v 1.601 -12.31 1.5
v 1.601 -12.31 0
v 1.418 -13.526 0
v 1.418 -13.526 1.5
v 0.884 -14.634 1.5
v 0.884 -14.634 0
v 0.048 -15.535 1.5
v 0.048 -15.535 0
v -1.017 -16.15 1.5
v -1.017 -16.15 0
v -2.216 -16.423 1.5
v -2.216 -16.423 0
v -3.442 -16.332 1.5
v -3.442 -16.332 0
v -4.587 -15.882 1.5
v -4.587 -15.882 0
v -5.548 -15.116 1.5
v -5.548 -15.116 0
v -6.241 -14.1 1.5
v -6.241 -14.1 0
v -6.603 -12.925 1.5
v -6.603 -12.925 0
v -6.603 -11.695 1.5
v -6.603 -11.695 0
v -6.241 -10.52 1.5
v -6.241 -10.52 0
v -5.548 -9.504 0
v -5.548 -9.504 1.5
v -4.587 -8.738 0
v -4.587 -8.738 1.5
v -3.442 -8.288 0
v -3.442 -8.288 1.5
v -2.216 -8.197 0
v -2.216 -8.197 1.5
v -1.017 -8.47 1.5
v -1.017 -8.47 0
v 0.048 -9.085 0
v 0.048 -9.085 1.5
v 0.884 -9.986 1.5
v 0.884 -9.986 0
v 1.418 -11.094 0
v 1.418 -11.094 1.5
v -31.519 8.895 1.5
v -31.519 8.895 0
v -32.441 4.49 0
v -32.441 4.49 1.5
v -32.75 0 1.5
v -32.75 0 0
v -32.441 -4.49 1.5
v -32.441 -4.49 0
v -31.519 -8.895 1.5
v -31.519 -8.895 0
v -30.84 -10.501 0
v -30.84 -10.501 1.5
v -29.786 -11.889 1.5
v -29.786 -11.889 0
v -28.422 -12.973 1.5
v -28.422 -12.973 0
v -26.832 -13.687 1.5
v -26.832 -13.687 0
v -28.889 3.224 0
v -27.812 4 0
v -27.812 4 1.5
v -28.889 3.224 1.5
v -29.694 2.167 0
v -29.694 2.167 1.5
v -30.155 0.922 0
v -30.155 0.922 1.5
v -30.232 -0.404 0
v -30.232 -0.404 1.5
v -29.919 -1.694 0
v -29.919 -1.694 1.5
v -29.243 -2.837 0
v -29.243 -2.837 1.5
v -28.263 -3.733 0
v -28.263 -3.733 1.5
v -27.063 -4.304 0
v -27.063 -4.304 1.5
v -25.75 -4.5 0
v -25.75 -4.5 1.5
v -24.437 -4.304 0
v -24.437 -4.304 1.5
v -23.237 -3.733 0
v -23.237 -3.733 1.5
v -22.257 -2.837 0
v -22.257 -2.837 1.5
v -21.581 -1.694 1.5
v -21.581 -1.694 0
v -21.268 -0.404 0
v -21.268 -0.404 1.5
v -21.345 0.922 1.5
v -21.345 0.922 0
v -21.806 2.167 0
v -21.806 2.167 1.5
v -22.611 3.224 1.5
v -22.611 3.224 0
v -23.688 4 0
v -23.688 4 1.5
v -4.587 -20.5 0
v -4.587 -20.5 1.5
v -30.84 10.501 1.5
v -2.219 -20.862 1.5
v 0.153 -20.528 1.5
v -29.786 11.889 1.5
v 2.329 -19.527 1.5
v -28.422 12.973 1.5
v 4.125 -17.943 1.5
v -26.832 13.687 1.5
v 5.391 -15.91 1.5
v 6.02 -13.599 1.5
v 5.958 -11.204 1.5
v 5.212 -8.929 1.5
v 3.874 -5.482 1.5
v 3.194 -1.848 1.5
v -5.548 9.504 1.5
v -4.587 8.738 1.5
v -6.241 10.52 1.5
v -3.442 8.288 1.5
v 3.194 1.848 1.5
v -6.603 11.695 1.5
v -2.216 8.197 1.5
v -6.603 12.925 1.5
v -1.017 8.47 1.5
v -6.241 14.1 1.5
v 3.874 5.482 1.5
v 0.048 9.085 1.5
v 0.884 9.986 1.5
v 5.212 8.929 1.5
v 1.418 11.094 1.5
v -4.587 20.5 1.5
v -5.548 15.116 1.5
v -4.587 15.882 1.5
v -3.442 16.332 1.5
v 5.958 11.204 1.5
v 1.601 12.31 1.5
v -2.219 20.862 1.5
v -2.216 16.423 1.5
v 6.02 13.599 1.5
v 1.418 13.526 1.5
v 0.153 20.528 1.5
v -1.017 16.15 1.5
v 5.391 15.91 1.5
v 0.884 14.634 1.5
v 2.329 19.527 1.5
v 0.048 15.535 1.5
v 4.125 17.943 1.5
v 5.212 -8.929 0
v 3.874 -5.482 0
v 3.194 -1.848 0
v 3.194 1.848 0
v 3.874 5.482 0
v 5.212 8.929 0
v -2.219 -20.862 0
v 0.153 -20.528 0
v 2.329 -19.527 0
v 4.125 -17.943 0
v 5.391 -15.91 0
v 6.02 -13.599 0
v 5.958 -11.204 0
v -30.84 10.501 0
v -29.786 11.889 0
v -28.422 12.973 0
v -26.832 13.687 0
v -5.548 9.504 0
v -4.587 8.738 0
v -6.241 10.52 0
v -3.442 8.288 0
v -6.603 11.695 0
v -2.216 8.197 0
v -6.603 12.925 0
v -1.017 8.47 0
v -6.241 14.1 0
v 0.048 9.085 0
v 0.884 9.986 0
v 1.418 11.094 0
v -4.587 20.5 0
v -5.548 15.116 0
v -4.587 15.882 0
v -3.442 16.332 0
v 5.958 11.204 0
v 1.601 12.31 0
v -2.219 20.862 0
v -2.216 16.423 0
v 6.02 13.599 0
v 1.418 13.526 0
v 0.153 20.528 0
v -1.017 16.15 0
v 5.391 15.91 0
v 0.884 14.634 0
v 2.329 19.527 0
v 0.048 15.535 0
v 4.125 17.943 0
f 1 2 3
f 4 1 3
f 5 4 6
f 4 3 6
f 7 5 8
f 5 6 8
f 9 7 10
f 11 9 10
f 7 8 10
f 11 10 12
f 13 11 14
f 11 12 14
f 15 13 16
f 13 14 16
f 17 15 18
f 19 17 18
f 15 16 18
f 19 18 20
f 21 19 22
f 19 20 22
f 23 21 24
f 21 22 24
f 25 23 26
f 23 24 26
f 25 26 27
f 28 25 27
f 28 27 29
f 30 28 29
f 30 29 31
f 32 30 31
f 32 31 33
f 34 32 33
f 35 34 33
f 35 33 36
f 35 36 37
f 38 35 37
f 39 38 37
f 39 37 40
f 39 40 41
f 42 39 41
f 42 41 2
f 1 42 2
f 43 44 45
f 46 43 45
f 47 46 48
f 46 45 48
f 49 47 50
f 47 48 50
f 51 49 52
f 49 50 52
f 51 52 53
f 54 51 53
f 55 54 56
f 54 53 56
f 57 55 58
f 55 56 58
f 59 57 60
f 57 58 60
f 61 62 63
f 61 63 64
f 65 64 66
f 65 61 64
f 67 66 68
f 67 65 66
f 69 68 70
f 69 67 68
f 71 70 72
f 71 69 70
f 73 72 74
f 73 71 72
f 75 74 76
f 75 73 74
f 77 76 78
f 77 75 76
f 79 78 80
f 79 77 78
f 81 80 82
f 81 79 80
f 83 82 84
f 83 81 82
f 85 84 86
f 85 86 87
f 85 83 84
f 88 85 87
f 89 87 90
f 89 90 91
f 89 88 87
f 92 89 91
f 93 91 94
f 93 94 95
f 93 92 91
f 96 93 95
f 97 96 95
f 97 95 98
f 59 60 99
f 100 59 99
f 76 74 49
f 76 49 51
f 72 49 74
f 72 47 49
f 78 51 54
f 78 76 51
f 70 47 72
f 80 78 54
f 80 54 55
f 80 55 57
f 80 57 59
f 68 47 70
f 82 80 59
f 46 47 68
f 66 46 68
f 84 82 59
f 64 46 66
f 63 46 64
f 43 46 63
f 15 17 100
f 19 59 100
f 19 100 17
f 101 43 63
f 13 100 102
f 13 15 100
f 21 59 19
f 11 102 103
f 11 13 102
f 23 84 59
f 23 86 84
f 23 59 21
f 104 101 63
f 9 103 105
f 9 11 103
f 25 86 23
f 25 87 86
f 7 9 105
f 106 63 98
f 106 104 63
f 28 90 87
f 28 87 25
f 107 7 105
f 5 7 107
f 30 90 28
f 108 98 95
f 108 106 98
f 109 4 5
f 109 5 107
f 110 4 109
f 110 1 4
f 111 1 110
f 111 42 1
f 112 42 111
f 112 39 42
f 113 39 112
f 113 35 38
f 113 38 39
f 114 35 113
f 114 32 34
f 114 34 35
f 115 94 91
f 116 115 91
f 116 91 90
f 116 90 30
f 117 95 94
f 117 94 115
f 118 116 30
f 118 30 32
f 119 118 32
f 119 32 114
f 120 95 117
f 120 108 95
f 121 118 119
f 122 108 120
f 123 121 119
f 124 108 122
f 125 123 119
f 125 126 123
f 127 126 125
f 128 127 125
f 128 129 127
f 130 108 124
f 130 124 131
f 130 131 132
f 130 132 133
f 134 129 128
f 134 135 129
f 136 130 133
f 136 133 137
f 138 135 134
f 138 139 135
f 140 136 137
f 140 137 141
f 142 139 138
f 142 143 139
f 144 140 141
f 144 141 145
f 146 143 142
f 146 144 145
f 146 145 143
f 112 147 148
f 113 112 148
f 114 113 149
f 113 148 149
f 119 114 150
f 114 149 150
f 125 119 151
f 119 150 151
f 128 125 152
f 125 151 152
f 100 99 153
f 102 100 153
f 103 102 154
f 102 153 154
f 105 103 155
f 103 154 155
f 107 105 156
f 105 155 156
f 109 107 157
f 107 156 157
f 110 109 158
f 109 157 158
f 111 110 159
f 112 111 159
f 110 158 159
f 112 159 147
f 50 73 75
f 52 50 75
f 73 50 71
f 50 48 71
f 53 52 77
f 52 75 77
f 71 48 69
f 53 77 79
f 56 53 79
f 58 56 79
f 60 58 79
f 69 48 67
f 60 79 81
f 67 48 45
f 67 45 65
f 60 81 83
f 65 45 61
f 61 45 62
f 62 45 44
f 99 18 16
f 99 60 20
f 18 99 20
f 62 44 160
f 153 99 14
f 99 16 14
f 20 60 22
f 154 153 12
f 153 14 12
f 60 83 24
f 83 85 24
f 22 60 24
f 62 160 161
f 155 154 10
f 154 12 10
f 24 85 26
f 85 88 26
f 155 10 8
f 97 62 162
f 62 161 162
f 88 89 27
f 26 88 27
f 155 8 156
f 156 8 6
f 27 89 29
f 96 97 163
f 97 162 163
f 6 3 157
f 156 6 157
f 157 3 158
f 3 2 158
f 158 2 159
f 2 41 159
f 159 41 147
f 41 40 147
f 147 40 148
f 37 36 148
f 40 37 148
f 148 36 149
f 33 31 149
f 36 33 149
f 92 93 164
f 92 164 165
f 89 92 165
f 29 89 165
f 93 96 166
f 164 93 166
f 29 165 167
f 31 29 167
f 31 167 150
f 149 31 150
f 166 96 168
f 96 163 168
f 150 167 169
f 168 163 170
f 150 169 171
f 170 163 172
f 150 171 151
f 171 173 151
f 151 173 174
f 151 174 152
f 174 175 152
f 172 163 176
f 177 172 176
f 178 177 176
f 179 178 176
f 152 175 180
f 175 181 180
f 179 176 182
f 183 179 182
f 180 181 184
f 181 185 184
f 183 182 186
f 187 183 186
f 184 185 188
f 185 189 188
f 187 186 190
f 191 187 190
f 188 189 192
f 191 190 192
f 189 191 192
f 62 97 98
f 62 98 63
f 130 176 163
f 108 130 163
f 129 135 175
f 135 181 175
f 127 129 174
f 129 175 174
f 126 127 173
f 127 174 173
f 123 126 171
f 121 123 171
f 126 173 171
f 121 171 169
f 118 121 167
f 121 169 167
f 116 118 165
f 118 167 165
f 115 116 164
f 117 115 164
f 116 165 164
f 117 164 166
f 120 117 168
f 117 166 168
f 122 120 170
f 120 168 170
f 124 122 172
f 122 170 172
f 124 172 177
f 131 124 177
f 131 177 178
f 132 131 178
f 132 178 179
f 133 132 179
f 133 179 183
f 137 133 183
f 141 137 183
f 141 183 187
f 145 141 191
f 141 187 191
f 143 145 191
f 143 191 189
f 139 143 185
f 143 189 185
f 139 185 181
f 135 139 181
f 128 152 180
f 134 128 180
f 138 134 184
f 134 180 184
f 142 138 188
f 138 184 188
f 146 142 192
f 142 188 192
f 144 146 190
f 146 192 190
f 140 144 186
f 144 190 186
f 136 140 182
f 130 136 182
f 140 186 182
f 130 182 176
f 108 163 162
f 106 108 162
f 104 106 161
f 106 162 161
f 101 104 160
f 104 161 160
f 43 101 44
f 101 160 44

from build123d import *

# Parameters (mm, degrees)
BOSS_EXTRUDE1_DEPTH   = 1.5
IZIM1_R               = 4.125
KES_EKSTR_ZYON1_DEPTH = 5


with BuildPart() as part:
    # Sketch1 → Boss-Extrude1 (new body)
    with BuildSketch(Plane.XY):
        with BuildLine():
            Line((-4.586520611, 20.5), (-26.831876879, 13.6870336))
            ThreePointArc((-26.831876879, 13.6870336), (-29.786221501, 11.888574472), (-31.518862928, 8.895154845))
            ThreePointArc((-31.518862928, 8.895154845), (-32.75, 0), (-31.518862928, -8.895154845))
            ThreePointArc((-31.518862928, -8.895154845), (-29.786221501, -11.888574472), (-26.831876879, -13.6870336))
            Line((-26.831876879, -13.6870336), (-4.586520611, -20.5))
            ThreePointArc((-4.586520611, -20.5), (4.125457599, -17.942905427), (5.211648434, -8.928611974))
            ThreePointArc((5.211648434, -8.928611974), (3.108013658, 0), (5.211648434, 8.928611974))
            ThreePointArc((5.211648434, 8.928611974), (4.125457599, 17.942905427), (-4.586520611, 20.5))
        make_face()
        with BuildLine():
            Line((-23.688447187, 4), (-27.811552813, 4))
            ThreePointArc((-27.811552813, 4), (-25.75, -4.5), (-23.688447187, 4))
        make_face(mode=Mode.SUBTRACT)
    extrude(amount=BOSS_EXTRUDE1_DEPTH)

    # Çizim1 → Kes-Ekstrüzyon1 (cut, symmetric)
    with BuildSketch(Plane(origin=(0, 0, 0), x_dir=(-1, 0, 0), z_dir=(0, 0, -1))):
        with Locations(Location((2.524172848, -12.31, 0), (0, 0, 180))):
            Circle(IZIM1_R)
        with Locations(Location((2.524172848, 12.31, 0), (0, 0, 180))):
            Circle(IZIM1_R)
    extrude(amount=KES_EKSTR_ZYON1_DEPTH, both=True, mode=Mode.SUBTRACT)


solid = part.part
